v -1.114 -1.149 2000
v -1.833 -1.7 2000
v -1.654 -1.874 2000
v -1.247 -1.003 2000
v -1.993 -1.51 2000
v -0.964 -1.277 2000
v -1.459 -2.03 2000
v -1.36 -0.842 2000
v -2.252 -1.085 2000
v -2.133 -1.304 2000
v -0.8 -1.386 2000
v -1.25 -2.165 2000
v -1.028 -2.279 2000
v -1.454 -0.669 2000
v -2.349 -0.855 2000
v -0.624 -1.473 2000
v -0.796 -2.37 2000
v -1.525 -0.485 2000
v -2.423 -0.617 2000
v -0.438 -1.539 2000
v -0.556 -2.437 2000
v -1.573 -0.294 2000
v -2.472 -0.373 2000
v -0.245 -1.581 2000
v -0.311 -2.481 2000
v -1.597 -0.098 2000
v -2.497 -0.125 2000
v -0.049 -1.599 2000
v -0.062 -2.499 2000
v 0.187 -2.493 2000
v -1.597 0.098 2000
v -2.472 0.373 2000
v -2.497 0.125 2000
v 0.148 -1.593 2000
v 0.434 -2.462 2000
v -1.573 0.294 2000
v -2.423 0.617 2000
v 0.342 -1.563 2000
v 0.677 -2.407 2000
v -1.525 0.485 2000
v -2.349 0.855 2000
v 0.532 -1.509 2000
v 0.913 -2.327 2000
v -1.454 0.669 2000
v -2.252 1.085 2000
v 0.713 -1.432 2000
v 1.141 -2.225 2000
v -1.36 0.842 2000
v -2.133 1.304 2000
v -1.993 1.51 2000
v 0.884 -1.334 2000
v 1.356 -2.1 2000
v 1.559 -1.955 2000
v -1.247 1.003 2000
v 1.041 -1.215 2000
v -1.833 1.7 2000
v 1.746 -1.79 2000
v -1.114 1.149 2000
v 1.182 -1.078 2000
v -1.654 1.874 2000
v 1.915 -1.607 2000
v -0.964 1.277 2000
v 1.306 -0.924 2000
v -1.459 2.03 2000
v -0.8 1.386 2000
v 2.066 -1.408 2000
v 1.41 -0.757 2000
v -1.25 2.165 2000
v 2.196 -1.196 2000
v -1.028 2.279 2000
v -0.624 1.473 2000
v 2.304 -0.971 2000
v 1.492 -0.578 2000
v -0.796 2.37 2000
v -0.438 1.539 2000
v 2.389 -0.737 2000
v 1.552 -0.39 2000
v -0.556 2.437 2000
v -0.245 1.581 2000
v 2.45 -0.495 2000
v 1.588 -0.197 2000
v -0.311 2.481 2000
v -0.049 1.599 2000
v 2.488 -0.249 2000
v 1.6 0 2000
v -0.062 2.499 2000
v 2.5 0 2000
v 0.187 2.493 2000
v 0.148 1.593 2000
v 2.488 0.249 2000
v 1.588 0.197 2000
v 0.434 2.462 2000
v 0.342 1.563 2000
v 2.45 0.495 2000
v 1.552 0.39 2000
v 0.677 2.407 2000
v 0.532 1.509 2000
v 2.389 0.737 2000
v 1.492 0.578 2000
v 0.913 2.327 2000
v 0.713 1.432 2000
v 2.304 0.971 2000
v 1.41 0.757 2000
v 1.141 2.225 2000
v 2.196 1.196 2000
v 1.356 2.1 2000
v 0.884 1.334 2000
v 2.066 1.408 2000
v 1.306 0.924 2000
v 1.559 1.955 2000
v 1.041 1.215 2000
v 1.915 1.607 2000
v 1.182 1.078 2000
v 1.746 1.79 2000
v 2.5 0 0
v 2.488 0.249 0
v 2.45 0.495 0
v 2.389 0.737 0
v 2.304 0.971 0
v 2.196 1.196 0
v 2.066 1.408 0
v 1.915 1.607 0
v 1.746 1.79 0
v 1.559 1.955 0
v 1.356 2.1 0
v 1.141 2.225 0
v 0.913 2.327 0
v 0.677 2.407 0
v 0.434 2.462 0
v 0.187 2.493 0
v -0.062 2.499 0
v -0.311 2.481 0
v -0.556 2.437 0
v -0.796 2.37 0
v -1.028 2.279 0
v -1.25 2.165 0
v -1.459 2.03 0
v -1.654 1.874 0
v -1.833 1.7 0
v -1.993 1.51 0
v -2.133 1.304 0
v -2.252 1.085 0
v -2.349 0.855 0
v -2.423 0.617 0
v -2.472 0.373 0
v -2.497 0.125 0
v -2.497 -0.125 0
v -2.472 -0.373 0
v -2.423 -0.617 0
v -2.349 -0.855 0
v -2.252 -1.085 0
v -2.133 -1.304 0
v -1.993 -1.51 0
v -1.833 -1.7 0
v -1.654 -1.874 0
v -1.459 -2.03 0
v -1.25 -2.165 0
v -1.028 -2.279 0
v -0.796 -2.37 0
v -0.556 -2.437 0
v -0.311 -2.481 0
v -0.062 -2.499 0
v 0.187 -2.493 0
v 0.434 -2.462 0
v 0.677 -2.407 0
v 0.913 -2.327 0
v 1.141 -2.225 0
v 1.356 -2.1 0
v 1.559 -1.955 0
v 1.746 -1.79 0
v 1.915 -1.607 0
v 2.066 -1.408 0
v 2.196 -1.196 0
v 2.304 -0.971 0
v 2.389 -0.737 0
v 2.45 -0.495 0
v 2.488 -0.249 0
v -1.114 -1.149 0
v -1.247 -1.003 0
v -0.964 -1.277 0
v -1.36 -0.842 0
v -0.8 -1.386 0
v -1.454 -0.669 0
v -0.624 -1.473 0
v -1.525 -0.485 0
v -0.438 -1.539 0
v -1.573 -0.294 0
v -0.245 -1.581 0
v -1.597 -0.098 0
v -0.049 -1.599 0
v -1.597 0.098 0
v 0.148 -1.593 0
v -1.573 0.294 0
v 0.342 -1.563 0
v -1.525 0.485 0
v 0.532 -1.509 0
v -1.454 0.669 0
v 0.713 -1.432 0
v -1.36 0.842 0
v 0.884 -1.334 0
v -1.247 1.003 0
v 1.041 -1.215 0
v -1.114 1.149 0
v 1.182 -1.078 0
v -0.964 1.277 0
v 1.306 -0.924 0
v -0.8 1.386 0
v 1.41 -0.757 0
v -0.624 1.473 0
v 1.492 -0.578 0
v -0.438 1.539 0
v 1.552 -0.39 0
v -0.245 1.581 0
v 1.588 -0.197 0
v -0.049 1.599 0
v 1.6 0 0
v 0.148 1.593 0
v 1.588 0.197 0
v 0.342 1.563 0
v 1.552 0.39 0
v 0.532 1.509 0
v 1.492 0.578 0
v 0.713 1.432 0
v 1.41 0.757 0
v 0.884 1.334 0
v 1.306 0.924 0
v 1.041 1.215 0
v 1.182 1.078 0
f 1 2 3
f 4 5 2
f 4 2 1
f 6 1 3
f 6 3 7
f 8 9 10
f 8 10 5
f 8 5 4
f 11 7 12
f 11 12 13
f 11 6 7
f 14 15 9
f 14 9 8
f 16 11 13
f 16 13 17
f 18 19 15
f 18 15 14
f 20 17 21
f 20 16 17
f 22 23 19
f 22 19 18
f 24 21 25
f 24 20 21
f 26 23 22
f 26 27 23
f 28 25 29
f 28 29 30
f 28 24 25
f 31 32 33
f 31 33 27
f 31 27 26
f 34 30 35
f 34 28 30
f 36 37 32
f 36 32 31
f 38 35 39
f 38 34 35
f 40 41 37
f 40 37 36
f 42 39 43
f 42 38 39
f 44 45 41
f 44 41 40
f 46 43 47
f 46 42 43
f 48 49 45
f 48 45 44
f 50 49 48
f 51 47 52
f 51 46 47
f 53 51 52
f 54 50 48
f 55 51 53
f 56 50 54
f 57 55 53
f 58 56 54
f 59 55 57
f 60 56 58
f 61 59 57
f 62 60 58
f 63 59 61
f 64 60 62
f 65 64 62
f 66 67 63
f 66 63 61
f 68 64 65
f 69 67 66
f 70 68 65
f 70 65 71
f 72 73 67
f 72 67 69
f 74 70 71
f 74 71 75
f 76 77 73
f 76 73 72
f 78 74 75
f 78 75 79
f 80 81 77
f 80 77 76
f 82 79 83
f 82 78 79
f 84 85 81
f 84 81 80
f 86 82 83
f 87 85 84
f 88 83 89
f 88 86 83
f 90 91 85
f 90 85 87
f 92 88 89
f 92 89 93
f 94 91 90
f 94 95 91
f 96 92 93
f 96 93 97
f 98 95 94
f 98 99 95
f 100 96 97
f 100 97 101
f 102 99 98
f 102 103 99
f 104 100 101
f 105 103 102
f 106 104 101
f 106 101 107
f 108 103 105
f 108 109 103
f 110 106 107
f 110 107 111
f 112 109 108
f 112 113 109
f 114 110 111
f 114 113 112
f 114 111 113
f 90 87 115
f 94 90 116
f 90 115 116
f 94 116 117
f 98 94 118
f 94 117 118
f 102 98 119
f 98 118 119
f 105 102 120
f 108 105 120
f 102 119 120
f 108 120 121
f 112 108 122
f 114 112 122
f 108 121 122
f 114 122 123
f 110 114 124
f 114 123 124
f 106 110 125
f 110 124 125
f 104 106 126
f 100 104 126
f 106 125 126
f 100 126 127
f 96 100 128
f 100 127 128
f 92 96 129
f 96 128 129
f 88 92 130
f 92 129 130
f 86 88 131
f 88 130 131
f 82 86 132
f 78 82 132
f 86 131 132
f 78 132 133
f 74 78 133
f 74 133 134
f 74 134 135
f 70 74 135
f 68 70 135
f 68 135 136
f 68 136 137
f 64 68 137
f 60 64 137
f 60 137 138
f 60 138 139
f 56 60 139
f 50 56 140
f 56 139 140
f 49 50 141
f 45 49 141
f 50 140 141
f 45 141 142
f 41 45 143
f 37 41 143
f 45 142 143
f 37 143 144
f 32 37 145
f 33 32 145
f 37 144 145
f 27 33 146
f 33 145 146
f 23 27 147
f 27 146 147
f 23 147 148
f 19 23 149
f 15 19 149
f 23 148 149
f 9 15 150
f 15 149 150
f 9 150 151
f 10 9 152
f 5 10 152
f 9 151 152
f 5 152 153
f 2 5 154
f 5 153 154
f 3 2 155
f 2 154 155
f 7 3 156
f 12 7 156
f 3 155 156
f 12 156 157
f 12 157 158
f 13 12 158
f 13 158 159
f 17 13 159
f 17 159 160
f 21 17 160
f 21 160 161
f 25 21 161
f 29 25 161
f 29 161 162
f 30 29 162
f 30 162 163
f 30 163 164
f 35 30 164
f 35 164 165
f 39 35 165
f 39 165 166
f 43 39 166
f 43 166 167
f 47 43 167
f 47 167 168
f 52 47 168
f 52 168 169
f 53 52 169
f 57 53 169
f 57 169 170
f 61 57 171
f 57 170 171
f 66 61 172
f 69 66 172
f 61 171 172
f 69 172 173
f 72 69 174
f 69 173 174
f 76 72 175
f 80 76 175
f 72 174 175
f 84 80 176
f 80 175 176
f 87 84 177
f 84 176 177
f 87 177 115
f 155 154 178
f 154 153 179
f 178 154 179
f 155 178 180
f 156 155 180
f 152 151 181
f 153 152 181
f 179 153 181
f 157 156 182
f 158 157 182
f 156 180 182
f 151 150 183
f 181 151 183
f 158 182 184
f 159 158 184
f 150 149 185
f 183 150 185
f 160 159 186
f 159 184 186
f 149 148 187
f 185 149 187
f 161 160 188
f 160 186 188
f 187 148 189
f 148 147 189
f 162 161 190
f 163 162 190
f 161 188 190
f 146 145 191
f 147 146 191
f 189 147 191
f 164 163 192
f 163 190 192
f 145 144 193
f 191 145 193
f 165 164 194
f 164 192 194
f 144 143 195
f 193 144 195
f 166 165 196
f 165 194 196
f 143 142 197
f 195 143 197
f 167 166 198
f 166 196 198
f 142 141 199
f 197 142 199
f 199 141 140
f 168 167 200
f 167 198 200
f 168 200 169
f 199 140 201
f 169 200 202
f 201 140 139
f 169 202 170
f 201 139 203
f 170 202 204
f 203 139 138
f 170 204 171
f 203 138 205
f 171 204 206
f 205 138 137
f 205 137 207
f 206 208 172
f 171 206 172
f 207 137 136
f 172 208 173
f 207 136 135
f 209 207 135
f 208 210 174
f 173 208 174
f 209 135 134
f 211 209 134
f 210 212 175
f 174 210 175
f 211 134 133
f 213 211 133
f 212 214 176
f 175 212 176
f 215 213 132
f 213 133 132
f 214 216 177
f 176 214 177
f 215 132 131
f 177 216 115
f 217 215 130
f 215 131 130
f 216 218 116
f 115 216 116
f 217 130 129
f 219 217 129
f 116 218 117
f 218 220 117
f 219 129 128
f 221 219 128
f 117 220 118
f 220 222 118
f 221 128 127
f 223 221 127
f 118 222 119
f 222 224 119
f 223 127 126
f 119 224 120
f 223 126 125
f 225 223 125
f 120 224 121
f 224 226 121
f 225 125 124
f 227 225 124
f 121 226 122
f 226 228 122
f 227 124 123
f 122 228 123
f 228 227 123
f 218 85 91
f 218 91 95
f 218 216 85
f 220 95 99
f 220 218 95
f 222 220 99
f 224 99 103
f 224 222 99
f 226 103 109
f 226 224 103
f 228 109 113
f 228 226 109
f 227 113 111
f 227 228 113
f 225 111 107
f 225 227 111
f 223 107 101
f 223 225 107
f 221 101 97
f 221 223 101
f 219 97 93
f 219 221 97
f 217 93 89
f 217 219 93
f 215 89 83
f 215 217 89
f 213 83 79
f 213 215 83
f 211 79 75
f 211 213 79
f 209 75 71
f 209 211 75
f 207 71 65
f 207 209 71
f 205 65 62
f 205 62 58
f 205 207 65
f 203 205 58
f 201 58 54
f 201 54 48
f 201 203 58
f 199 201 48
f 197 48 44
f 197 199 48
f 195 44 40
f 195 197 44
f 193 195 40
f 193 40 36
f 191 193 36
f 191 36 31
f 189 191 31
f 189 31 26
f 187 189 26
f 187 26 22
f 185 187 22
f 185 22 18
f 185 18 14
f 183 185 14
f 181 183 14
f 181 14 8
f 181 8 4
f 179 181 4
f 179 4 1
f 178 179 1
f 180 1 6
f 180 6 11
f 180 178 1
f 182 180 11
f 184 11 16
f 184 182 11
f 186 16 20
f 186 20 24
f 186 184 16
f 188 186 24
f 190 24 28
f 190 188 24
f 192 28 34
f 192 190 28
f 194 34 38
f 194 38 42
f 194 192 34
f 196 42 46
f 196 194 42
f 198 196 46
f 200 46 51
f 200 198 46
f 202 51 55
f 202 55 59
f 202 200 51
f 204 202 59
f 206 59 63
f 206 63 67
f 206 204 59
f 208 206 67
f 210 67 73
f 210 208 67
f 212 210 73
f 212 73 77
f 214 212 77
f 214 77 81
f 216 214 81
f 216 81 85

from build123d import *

# Parameters (mm, degrees)
SKETCH1_R           = 2.5
SKETCH1_R_2         = 1.6
BOSS_EXTRUDE1_DEPTH = 1000
SKETCH2_R           = 2.5
SKETCH2_R_2         = 1.6
BOSS_EXTRUDE2_DEPTH = 500
SKETCH3_R           = 2.5
SKETCH3_R_2         = 1.6
BOSS_EXTRUDE3_DEPTH = 500


with BuildPart() as part:
    # Sketch1 → Boss-Extrude1 (new body)
    with BuildSketch(Plane.XY):
        Circle(SKETCH1_R)
        Circle(SKETCH1_R_2, mode=Mode.SUBTRACT)
    extrude(amount=BOSS_EXTRUDE1_DEPTH)

    # Sketch2 → Boss-Extrude2 (add)
    with BuildSketch(Plane.XY.offset(1000)):
        Circle(SKETCH2_R)
        Circle(SKETCH2_R_2, mode=Mode.SUBTRACT)
    extrude(amount=BOSS_EXTRUDE2_DEPTH)

    # Sketch3 → Boss-Extrude3 (add)
    with BuildSketch(Plane.XY.offset(1500)):
        Circle(SKETCH3_R)
        Circle(SKETCH3_R_2, mode=Mode.SUBTRACT)
    extrude(amount=BOSS_EXTRUDE3_DEPTH)


solid = part.part
